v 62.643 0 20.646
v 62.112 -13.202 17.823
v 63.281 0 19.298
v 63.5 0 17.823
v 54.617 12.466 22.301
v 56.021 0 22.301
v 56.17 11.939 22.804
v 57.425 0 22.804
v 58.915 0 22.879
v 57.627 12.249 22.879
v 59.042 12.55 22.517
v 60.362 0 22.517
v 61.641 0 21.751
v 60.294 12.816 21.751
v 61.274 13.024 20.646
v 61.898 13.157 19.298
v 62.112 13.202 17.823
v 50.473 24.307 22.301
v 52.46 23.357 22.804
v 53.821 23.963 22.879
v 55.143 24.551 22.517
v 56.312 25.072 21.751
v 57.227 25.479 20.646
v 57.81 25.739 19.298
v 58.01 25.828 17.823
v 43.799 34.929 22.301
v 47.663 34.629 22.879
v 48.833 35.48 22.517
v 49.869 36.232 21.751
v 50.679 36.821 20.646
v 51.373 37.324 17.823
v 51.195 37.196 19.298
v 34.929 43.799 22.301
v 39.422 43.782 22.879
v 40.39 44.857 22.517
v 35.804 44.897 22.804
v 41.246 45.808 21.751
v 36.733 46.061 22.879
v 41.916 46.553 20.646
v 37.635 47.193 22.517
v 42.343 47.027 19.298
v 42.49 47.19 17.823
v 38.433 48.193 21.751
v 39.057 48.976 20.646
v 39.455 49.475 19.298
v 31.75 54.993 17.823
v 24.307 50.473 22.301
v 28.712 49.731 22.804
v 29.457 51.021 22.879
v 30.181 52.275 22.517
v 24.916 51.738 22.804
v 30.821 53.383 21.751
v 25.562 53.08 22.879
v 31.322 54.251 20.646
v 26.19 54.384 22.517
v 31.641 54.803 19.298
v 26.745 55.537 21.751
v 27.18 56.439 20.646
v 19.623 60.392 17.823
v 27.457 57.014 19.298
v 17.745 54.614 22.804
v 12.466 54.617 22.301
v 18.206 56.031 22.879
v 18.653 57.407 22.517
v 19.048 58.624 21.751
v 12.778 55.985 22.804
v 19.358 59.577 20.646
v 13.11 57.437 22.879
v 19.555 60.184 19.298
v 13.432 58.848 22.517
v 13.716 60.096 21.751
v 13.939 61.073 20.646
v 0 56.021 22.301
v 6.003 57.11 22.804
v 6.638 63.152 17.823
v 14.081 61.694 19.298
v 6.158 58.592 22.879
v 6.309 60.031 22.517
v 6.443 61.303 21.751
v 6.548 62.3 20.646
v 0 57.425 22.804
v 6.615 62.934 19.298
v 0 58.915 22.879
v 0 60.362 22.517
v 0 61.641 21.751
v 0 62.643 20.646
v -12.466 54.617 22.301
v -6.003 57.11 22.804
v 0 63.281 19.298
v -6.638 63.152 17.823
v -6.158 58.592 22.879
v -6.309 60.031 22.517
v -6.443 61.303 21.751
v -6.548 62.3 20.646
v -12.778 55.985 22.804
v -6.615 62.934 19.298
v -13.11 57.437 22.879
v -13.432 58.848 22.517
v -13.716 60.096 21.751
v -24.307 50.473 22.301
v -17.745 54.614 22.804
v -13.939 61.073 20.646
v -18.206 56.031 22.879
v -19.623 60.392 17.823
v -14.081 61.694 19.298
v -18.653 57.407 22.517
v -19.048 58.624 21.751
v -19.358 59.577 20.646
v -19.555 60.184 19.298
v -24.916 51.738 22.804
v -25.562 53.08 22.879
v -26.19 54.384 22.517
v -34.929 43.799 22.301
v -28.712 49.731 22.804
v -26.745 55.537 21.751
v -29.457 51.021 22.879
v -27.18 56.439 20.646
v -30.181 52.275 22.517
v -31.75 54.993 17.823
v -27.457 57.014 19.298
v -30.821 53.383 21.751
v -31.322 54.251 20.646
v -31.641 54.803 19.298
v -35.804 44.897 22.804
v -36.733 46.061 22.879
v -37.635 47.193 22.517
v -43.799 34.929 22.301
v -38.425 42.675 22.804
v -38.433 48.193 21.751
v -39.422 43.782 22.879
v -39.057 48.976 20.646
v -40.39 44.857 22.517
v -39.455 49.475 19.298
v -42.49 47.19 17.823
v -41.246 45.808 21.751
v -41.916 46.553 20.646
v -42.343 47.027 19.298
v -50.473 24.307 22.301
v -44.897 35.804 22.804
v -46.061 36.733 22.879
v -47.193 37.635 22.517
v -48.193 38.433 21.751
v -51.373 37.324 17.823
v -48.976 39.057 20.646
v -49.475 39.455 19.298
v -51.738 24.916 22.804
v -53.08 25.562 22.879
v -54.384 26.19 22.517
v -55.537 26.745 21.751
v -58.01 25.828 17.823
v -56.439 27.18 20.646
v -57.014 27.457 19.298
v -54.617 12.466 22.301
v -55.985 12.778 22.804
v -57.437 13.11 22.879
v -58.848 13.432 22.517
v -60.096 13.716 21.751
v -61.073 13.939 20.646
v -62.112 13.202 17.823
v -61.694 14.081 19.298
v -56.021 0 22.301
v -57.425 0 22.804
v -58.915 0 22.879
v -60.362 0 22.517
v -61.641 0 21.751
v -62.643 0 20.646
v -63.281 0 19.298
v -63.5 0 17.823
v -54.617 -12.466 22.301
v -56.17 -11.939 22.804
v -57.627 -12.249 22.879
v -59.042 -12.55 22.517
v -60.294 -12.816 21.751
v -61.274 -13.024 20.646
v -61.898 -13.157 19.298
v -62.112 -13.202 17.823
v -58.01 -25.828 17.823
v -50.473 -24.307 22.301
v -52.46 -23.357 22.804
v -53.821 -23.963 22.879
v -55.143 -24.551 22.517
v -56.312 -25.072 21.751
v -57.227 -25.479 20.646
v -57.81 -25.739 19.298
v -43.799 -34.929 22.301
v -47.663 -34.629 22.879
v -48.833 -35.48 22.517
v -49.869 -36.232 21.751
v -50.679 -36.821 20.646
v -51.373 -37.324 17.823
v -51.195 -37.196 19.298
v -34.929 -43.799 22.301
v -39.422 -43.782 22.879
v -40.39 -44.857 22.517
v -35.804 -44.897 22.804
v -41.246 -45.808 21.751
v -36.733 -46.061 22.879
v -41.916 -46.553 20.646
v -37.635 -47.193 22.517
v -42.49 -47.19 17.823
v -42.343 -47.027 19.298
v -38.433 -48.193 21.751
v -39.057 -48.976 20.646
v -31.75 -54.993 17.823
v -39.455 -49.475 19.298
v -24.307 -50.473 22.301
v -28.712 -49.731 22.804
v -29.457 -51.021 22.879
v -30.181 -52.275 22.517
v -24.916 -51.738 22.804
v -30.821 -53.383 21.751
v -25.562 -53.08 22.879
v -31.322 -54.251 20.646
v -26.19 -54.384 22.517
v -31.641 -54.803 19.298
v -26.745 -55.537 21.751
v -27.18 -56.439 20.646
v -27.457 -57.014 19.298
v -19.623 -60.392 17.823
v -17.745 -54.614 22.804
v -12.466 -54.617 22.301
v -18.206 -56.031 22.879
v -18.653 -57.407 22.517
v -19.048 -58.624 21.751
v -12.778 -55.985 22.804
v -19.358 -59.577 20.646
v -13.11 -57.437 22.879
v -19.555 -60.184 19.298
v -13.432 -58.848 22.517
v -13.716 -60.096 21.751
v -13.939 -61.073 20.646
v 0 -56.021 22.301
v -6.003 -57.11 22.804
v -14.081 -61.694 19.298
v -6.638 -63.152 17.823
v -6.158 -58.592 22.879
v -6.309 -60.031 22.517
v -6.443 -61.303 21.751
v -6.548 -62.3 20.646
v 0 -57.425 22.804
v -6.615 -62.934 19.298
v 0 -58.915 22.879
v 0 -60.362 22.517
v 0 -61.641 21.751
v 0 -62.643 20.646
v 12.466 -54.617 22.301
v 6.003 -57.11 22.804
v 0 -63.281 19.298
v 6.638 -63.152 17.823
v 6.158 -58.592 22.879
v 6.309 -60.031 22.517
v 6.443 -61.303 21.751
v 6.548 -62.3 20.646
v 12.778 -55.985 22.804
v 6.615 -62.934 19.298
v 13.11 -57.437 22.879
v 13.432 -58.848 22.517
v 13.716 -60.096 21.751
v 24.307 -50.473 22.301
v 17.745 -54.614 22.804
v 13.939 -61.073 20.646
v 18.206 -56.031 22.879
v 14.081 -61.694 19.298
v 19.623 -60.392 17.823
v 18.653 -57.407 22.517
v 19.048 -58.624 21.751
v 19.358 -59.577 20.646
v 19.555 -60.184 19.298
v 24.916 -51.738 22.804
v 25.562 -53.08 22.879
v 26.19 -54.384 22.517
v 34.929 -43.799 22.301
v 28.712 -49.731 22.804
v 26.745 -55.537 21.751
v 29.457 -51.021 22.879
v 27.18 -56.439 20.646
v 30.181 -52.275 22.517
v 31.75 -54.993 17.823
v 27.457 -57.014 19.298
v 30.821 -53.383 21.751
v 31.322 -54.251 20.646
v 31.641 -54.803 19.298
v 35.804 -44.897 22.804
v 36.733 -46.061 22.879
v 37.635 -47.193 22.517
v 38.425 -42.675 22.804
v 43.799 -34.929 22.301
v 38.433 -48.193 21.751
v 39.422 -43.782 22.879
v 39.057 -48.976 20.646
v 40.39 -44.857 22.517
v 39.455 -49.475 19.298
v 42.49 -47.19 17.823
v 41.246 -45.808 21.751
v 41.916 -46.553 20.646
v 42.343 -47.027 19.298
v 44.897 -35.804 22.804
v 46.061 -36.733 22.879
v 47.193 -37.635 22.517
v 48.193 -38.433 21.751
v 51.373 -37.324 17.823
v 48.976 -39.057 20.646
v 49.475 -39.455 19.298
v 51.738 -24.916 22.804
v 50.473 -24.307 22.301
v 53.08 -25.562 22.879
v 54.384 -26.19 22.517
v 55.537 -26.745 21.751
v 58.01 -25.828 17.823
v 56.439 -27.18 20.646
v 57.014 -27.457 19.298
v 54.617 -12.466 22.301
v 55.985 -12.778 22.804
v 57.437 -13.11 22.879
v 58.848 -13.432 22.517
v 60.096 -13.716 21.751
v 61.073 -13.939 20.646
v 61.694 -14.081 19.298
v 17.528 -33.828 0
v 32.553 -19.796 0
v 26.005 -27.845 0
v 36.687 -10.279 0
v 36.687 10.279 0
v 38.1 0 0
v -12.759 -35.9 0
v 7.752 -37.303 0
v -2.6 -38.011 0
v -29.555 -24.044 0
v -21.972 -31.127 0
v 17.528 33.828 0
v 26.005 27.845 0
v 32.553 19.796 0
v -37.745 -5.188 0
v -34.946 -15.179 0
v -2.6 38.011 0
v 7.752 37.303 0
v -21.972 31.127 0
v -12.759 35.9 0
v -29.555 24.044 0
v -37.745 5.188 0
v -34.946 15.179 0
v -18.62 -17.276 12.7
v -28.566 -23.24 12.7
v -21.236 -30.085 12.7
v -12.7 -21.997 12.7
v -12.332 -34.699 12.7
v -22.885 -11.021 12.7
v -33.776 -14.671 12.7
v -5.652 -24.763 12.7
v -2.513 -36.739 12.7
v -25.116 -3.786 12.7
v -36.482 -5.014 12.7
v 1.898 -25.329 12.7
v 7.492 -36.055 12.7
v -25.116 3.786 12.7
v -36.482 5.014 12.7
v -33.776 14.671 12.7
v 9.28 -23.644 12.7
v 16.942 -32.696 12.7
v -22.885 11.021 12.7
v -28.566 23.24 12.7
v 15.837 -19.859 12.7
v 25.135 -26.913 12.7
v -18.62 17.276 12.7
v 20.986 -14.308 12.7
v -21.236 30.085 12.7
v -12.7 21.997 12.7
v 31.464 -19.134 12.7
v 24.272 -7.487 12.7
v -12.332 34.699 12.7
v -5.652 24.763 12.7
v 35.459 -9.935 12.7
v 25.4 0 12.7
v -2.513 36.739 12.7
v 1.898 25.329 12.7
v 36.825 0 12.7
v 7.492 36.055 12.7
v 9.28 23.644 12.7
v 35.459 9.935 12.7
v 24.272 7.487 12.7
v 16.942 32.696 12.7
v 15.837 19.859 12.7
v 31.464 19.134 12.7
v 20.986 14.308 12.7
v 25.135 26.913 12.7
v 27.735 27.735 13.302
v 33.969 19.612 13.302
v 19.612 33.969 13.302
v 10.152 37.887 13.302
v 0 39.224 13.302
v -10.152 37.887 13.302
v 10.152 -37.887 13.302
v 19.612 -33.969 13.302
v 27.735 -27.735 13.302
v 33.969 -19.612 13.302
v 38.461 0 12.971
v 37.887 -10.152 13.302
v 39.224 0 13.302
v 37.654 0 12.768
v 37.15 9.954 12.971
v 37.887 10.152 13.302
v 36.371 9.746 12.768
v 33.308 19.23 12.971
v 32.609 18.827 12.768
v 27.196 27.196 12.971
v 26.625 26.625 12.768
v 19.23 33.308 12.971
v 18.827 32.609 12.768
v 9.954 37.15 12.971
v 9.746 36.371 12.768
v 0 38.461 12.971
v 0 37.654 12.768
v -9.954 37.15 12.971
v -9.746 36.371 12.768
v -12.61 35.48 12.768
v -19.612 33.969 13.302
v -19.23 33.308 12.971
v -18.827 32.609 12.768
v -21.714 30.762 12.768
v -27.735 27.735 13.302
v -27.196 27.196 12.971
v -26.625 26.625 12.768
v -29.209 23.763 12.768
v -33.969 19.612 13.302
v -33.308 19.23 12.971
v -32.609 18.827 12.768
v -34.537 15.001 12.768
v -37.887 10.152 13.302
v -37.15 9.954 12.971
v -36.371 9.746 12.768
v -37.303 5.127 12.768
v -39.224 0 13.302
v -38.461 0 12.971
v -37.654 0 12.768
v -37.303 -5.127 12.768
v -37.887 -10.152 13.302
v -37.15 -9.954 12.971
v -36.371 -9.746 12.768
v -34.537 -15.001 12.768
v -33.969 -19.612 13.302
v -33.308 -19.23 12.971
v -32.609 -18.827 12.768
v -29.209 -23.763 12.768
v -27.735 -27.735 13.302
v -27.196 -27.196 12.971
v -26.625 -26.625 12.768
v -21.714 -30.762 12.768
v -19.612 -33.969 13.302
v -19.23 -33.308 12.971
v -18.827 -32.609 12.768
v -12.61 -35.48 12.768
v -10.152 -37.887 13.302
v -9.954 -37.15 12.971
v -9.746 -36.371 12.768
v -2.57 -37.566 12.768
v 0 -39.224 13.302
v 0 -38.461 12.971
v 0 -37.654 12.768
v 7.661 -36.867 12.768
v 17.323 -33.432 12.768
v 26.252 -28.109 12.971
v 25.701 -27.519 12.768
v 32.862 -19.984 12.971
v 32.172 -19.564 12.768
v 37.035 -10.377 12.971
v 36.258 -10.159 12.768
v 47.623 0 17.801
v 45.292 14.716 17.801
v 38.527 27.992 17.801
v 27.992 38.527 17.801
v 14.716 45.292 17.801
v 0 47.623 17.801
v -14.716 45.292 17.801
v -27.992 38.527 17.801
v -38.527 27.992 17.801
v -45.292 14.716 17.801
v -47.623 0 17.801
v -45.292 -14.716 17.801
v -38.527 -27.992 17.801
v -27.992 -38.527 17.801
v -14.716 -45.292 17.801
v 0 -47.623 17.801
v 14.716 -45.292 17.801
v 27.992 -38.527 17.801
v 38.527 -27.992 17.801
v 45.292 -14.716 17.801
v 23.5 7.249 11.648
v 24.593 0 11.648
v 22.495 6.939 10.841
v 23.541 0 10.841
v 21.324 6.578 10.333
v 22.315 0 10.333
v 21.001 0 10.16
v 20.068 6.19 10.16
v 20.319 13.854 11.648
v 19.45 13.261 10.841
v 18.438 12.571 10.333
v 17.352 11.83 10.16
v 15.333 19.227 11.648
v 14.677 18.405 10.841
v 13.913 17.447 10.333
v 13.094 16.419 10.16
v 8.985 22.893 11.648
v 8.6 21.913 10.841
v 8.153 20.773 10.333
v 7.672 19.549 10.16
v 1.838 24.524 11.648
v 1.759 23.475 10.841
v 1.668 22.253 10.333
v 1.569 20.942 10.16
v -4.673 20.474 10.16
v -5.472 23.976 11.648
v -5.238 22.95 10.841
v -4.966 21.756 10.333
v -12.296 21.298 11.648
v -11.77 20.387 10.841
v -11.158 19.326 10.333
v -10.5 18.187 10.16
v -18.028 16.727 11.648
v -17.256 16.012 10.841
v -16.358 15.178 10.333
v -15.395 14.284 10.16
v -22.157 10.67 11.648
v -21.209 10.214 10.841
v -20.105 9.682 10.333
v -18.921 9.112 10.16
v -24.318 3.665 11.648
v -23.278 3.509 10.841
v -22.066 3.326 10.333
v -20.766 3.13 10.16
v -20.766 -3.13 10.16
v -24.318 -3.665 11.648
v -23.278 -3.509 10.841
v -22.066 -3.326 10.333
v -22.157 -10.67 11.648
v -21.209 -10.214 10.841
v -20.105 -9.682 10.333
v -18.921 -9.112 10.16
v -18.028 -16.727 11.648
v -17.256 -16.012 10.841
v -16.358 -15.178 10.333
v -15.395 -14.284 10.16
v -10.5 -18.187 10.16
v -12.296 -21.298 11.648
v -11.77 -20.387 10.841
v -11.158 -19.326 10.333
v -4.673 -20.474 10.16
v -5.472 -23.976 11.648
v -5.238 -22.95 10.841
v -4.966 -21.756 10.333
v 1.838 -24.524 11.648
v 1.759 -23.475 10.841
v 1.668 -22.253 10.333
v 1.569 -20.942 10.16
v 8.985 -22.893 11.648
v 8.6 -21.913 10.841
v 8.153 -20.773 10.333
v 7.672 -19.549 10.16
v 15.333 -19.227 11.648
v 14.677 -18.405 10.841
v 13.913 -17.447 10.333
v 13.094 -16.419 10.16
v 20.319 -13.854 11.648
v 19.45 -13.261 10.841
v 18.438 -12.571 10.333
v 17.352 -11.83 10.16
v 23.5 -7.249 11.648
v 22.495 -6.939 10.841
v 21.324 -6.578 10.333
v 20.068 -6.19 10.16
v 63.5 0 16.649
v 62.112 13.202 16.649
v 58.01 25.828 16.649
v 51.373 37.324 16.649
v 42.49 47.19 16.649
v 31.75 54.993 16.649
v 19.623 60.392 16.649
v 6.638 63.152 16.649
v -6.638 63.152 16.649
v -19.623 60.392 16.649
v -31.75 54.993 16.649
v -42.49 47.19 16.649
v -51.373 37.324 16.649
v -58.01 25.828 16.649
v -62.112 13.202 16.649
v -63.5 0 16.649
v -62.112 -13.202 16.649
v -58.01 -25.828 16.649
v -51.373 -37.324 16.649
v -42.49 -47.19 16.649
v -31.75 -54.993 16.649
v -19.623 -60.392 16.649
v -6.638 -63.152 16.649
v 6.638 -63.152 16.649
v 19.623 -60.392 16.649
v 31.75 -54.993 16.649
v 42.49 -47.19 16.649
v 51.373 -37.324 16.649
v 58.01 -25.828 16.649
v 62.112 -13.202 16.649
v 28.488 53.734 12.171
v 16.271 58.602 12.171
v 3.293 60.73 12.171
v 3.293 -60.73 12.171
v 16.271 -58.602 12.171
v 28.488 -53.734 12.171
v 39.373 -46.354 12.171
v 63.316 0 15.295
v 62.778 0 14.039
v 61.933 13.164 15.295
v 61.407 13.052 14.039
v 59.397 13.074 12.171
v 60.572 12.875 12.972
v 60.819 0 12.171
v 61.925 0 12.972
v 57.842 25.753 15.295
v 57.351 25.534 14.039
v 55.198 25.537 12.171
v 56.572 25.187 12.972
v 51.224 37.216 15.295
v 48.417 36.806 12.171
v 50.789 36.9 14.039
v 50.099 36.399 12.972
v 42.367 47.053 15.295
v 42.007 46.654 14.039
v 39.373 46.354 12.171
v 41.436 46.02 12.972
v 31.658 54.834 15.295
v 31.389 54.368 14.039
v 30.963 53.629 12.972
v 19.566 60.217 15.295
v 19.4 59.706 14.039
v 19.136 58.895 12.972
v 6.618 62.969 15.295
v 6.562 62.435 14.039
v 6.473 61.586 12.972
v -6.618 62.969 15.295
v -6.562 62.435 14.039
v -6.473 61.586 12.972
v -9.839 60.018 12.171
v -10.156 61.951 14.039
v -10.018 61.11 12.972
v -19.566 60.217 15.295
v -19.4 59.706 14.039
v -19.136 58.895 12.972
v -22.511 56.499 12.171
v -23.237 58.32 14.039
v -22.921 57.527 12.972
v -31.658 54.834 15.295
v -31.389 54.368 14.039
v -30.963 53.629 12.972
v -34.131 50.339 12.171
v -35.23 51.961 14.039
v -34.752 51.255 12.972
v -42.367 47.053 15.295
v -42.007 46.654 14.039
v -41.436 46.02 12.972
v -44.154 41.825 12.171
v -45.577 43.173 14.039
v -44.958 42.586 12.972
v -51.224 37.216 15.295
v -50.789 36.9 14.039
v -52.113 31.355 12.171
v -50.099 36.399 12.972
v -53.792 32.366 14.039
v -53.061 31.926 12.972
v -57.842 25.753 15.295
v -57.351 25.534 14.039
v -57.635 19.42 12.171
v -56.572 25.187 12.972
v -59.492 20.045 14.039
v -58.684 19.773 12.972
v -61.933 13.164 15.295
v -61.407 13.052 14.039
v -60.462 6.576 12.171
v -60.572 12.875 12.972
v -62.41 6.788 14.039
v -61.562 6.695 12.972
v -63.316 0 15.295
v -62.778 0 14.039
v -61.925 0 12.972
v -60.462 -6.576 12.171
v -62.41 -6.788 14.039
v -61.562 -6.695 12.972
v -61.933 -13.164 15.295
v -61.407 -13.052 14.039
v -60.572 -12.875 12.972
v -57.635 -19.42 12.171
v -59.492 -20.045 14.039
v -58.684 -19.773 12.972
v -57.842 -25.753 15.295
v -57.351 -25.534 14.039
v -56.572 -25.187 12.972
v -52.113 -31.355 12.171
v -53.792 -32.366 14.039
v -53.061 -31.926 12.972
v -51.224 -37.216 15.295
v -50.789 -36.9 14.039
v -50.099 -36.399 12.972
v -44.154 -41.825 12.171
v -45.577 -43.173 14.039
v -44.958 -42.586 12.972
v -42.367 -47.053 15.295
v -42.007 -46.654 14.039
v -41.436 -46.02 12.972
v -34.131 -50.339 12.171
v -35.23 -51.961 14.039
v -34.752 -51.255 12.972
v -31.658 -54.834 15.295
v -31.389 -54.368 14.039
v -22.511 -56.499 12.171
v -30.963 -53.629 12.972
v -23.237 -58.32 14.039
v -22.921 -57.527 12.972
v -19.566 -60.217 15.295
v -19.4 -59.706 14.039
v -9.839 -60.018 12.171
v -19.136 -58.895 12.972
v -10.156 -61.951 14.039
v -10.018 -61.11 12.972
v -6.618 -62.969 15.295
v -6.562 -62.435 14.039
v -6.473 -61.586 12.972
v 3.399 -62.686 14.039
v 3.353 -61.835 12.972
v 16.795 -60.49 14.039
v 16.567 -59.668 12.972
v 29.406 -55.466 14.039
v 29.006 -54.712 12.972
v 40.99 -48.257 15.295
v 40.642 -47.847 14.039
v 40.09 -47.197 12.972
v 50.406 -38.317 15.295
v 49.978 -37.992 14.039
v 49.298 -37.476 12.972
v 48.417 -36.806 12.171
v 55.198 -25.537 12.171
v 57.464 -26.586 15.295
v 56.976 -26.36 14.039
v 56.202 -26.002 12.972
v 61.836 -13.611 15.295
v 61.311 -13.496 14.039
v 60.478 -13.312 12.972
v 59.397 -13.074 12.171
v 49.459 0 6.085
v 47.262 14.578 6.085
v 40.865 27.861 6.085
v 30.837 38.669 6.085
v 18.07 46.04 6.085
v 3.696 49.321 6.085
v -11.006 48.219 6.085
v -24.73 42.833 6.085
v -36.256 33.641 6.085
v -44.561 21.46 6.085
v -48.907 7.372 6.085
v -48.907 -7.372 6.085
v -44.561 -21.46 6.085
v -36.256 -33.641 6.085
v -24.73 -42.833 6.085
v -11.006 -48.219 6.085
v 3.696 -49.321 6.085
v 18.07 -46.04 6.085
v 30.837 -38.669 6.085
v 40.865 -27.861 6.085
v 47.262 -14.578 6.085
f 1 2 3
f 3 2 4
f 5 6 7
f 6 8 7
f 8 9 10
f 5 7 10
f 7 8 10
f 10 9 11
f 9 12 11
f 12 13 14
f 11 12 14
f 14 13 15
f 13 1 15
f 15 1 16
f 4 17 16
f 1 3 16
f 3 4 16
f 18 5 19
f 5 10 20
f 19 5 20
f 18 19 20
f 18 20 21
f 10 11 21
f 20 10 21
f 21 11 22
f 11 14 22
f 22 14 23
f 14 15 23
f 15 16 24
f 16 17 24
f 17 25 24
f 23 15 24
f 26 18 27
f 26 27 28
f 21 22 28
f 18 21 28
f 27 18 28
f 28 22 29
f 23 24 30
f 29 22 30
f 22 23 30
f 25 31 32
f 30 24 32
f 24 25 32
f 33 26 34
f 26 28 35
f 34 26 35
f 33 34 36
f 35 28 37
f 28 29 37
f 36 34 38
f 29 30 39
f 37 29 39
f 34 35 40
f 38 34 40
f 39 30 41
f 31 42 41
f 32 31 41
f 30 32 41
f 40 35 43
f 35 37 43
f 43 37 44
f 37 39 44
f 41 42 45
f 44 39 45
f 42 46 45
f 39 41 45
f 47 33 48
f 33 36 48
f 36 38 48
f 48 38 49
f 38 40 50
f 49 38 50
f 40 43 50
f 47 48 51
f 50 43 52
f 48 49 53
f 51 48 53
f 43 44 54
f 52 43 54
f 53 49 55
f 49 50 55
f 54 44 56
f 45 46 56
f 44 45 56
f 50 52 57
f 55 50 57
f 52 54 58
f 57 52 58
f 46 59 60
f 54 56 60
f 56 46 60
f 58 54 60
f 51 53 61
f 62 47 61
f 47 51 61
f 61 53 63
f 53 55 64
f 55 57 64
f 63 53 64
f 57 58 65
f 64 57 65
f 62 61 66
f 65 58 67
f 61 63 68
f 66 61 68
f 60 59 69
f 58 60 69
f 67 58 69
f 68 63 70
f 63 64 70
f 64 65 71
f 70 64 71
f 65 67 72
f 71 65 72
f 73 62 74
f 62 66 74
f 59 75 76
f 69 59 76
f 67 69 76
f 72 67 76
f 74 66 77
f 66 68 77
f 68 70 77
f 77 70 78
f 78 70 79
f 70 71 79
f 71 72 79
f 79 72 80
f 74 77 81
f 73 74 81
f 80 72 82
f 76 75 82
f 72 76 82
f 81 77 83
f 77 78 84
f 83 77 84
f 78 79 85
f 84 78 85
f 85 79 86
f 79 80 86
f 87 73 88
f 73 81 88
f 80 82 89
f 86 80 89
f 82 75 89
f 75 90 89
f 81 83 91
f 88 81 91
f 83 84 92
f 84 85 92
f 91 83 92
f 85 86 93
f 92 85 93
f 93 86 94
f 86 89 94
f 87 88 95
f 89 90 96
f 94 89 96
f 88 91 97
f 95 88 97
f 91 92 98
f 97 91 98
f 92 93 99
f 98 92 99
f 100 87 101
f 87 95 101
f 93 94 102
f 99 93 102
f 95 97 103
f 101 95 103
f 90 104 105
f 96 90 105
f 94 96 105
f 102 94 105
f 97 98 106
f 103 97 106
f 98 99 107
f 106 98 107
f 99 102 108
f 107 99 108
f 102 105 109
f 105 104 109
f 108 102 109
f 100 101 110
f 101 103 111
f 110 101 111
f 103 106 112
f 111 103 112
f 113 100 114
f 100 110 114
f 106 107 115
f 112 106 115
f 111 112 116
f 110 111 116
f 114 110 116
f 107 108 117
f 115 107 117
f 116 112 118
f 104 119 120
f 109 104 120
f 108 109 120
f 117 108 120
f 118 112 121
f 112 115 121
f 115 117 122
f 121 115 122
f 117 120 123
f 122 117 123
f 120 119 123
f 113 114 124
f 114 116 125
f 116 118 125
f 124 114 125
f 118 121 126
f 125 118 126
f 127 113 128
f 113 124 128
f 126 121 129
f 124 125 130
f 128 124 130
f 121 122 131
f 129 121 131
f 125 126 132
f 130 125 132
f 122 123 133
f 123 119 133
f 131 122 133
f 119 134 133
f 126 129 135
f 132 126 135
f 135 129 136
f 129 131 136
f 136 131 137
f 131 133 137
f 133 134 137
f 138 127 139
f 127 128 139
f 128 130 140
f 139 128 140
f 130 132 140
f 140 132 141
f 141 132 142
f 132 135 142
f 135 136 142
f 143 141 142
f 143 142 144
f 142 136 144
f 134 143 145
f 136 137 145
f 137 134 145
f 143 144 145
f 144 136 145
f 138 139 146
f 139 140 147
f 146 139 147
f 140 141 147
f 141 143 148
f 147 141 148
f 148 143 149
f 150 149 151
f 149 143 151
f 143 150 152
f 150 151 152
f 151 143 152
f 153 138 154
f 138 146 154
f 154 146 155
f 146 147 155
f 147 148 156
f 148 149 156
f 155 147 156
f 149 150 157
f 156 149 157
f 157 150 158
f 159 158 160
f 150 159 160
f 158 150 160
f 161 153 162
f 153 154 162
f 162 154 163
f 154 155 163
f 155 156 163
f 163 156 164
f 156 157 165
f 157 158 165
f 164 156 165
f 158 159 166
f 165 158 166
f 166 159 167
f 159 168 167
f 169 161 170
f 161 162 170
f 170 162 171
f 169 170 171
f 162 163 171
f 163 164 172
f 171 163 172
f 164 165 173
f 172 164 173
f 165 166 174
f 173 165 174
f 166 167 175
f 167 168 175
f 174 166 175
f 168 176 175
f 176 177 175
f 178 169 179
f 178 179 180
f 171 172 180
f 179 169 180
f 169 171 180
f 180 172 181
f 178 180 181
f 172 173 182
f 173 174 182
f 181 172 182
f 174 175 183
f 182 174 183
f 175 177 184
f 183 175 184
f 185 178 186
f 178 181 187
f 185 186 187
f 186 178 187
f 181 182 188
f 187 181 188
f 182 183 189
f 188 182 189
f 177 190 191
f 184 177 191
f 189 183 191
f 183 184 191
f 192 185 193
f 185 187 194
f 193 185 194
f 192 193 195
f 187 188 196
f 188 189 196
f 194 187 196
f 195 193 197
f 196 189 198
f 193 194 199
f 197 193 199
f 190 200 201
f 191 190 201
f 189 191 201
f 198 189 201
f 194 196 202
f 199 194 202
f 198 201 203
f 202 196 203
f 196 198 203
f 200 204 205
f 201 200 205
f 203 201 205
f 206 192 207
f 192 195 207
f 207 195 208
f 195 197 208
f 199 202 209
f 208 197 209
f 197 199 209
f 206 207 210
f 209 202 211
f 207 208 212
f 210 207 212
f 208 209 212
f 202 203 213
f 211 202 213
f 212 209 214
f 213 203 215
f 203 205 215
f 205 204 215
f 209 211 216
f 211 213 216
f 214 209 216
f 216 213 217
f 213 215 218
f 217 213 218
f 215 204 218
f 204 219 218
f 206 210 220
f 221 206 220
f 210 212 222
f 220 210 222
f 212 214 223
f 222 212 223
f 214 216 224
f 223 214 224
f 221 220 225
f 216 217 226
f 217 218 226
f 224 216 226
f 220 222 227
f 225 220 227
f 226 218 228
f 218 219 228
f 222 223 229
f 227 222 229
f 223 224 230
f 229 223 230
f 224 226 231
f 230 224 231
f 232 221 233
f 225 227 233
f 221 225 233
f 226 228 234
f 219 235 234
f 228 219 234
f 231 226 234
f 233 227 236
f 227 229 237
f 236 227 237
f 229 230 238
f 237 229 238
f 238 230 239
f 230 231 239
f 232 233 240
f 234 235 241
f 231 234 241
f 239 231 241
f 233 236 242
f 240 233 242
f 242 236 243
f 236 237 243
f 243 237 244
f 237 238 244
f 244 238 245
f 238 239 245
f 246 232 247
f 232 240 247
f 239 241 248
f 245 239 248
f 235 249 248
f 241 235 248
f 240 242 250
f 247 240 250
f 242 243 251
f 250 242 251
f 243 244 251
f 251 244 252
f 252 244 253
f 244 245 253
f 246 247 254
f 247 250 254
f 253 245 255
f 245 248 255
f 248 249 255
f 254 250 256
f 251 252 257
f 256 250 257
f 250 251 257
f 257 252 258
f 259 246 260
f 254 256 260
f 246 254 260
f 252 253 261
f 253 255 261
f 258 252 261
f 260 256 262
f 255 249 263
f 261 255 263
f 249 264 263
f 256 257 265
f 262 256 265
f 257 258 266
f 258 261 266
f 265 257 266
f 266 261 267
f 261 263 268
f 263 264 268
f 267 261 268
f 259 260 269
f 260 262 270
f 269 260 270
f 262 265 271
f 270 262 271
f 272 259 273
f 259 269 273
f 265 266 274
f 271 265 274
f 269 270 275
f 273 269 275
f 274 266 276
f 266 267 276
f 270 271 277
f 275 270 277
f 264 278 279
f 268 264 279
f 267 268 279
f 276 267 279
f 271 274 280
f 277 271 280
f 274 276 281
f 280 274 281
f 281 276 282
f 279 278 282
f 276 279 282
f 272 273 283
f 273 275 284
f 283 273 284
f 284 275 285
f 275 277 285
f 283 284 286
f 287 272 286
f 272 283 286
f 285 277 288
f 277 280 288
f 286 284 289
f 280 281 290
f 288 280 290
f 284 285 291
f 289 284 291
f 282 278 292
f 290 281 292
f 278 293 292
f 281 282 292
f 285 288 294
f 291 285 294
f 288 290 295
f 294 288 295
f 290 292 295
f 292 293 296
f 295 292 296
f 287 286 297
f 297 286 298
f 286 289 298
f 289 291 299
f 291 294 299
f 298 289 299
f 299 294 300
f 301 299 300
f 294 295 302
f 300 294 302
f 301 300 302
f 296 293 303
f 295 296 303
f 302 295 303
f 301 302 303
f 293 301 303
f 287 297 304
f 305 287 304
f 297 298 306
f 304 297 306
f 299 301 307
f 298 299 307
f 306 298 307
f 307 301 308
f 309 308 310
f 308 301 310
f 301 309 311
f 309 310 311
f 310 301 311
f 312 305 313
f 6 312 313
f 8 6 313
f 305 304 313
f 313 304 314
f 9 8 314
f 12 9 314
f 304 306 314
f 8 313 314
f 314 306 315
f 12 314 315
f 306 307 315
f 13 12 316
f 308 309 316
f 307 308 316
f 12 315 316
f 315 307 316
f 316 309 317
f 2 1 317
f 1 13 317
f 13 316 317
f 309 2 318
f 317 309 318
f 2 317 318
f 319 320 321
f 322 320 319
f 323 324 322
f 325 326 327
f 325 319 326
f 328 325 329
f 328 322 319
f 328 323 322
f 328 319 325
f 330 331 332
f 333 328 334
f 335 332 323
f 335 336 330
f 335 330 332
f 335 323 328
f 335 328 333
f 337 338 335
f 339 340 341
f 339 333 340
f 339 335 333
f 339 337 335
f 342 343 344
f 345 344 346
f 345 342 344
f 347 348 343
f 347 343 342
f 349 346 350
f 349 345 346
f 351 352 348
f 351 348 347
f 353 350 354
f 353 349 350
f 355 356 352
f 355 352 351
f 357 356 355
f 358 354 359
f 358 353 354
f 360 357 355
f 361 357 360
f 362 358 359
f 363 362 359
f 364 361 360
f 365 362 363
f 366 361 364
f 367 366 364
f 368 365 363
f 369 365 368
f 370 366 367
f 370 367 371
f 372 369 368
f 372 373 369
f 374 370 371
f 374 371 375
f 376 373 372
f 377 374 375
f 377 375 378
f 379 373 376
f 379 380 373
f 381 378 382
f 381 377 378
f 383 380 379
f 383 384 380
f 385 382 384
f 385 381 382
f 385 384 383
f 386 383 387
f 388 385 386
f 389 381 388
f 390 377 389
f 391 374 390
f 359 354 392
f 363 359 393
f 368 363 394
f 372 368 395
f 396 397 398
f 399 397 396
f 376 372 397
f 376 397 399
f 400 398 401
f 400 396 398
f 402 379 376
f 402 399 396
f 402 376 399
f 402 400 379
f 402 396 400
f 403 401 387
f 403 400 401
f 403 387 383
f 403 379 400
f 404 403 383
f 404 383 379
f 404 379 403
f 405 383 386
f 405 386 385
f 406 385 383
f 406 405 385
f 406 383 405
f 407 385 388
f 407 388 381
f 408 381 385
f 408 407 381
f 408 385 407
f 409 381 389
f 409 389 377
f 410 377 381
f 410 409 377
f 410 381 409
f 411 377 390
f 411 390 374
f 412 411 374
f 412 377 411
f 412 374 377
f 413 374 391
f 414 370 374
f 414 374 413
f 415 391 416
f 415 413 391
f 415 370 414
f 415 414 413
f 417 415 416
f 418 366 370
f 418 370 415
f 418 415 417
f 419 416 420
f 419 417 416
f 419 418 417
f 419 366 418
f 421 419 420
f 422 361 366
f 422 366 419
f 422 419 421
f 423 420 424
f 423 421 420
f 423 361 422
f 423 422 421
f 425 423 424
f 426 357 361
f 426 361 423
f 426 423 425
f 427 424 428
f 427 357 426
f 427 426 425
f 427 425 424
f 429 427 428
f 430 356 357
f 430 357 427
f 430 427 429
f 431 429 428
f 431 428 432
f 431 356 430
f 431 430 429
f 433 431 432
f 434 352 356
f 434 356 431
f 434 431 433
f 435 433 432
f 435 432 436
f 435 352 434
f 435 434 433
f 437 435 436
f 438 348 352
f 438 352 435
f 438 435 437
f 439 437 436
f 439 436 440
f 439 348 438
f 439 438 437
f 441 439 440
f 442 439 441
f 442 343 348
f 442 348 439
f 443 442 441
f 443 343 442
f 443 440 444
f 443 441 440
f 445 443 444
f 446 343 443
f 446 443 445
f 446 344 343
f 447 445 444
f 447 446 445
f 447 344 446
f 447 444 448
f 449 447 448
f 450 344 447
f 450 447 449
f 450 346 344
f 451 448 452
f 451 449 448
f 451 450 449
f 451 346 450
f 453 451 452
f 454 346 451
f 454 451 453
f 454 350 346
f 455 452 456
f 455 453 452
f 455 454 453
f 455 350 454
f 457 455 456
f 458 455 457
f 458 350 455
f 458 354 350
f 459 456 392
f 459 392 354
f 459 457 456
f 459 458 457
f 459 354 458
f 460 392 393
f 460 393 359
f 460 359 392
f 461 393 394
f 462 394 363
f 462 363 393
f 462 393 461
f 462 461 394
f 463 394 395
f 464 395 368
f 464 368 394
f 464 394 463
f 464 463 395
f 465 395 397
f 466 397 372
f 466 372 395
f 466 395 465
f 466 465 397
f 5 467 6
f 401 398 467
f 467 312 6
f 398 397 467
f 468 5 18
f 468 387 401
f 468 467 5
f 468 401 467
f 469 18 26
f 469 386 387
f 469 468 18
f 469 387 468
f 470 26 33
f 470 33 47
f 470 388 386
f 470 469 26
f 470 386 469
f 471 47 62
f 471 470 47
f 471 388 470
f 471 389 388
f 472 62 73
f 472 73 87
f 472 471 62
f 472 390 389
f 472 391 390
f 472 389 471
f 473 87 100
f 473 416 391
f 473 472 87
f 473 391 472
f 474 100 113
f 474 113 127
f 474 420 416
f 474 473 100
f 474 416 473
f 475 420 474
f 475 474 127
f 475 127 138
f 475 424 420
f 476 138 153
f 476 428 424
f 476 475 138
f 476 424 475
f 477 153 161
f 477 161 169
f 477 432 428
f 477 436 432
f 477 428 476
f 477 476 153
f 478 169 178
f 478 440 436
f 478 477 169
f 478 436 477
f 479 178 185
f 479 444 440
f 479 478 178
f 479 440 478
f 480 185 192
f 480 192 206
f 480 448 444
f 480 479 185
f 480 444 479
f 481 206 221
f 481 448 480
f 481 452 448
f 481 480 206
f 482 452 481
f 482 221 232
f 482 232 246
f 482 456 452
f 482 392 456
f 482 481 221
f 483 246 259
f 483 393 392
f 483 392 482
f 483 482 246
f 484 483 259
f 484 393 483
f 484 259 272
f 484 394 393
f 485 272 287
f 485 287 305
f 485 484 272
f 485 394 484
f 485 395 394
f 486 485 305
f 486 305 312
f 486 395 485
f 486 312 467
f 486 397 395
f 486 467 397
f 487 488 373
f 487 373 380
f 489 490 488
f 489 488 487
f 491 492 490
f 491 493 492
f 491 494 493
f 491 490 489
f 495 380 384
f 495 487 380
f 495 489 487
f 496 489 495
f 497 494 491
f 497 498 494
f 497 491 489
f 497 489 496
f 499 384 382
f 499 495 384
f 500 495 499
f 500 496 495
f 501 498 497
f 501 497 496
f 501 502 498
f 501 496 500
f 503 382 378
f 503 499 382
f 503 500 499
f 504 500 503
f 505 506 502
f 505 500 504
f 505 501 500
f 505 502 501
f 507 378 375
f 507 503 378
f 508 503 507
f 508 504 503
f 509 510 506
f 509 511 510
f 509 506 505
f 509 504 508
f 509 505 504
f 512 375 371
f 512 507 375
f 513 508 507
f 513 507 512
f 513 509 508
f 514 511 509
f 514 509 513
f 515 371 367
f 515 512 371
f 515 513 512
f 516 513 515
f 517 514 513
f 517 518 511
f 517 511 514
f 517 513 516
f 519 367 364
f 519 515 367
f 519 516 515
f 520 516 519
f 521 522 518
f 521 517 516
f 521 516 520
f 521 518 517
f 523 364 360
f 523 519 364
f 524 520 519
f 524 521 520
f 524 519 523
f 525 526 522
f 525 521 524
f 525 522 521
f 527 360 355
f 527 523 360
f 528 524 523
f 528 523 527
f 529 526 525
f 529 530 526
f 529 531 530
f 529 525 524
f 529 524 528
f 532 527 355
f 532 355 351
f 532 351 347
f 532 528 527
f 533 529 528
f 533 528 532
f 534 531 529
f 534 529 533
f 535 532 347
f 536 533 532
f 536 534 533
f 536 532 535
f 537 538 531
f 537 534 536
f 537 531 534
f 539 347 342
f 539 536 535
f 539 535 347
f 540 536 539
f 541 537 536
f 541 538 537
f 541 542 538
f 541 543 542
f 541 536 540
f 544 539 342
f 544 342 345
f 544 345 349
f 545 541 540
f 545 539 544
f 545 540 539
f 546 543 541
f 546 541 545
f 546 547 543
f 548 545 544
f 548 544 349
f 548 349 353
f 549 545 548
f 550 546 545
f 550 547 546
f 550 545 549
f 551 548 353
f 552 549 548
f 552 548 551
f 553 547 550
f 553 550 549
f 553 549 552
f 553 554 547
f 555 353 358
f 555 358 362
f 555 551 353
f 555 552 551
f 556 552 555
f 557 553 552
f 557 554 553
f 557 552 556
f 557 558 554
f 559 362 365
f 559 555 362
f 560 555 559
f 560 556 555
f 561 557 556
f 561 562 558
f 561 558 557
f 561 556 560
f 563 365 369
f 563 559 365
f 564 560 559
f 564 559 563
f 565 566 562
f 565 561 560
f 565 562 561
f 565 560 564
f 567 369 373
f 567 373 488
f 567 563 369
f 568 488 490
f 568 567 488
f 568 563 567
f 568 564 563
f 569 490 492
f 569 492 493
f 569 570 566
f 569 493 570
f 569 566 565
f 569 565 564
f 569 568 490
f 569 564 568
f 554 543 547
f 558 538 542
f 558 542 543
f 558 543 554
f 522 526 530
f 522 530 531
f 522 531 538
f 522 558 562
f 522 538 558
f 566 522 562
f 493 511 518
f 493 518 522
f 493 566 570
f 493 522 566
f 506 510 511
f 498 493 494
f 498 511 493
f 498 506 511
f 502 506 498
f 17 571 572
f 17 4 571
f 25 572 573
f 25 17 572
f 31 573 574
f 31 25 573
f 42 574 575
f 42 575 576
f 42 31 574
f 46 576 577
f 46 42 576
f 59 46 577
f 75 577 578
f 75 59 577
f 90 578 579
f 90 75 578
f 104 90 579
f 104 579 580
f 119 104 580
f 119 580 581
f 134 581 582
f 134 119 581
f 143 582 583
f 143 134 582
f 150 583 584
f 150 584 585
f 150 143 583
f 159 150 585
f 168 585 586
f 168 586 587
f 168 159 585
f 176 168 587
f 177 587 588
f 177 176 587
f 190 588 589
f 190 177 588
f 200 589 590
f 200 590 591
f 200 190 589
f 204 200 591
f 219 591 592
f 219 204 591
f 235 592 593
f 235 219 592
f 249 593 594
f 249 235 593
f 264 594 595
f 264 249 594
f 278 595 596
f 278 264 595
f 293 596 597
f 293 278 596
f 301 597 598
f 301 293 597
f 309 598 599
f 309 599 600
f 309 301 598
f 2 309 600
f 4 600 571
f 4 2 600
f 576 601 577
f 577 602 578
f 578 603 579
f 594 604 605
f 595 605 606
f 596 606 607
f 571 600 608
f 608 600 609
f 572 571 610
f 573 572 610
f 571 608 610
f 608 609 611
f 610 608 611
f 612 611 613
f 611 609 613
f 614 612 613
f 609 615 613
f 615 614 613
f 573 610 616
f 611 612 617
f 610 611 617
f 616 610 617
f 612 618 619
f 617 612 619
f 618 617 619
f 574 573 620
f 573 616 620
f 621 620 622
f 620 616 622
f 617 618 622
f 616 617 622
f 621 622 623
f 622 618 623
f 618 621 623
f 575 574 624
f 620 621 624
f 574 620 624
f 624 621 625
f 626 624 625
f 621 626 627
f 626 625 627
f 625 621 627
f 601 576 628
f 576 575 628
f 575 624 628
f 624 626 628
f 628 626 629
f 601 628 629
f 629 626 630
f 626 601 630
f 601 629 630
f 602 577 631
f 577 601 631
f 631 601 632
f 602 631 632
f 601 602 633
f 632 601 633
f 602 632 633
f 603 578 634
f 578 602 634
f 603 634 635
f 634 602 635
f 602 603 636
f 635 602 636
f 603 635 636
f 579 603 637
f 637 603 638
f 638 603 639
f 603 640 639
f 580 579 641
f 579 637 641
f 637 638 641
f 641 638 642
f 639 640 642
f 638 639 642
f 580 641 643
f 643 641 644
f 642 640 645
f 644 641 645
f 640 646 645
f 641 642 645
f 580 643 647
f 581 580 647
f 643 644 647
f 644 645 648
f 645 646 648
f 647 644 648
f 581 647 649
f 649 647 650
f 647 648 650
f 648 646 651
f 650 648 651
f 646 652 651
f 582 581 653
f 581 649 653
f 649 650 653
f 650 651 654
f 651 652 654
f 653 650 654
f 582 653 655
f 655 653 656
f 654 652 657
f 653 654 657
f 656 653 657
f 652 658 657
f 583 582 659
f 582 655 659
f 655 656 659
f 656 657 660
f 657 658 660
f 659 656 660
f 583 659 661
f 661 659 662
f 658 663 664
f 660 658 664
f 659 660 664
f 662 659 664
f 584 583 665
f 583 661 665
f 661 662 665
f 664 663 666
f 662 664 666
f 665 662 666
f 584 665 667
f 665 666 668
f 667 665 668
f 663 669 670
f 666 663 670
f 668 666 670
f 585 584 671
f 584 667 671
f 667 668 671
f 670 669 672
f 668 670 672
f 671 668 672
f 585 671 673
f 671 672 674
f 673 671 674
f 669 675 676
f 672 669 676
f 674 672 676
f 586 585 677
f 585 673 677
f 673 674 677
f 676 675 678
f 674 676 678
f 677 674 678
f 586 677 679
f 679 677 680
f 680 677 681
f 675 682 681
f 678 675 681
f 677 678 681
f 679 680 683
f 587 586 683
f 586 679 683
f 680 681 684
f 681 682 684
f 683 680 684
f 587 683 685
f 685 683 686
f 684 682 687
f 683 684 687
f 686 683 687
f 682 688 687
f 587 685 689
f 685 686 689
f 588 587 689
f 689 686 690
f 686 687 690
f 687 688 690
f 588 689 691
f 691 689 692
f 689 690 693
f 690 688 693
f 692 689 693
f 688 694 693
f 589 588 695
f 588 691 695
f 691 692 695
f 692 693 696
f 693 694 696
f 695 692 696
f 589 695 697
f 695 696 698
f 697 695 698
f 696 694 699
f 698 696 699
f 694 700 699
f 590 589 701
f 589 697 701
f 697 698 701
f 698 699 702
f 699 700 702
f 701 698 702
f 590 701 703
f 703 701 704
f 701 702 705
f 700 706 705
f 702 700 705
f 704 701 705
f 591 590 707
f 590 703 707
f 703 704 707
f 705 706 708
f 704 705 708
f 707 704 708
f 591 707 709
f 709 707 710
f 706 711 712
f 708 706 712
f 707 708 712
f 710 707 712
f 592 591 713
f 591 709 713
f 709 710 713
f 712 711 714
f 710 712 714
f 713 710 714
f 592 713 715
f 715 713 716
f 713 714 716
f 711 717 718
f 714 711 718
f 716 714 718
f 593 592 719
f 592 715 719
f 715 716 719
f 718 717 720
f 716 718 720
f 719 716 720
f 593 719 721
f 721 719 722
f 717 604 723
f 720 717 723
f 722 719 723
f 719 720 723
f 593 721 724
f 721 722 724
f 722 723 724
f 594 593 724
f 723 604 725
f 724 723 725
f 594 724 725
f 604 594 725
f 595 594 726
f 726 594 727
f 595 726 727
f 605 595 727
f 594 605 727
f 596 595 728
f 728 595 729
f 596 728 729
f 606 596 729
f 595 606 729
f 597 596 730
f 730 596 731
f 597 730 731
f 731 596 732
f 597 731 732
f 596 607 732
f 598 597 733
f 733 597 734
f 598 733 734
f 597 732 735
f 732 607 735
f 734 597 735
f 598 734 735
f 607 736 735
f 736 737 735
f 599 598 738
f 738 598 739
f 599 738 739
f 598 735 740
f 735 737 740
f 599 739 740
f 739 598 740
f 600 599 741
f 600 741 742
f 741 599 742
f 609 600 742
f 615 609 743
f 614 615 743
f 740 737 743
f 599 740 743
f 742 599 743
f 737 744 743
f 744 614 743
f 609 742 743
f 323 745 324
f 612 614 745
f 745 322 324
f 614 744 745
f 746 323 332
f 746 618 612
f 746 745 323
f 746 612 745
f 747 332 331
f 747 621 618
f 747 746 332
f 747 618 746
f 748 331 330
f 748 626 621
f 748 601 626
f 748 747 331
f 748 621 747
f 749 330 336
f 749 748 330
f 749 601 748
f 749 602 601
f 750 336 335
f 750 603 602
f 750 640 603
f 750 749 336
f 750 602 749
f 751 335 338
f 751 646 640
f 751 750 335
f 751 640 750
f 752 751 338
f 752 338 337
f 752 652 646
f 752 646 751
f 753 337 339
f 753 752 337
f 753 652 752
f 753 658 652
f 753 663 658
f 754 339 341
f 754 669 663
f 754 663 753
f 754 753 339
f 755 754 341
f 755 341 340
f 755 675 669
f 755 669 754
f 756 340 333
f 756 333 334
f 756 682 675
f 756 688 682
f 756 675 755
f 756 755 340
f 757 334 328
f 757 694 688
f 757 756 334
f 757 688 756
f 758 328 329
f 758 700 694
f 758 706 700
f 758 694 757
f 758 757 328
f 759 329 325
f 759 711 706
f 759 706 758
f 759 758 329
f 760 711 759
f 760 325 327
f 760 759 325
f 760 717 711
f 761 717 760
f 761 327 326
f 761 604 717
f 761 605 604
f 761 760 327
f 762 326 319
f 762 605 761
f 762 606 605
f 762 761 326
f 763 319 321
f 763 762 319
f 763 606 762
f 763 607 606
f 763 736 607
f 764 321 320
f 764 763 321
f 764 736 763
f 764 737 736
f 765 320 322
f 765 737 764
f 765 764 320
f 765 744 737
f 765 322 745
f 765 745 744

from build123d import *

# Parameters (mm, degrees)
F3_R     = 25.4
F4_DEPTH = 2.54


# Not quite as in the source:
# - a fillet or chamfer that OpenCascade refuses, or shapes differently, is made with other operations: its cross-section is extruded or revolved along the edge and cut away or added


with BuildPart() as f2:
    # F0 (on Front) → F2 (revolve)
    with BuildSketch(Plane.XZ):
        Polygon((63.5, 13.6071443505), (63.5, 26.3071443505), (38.1, 12.7), (0, 12.7), (0, 0), (38.1, 0), align=None)
    revolve(axis=Axis((0, 0, 37.3074896634), (0, 0, 1)))

    # F3 (on face) → F4 (cut)
    with BuildSketch(Plane.XY.offset(12.7)):
        Circle(F3_R)
    extrude(amount=-F4_DEPTH, mode=Mode.SUBTRACT)

    # F5: fillet of radius 5.08 on 4 edges, made by hand

    # F5_s1 → F5_t2 (revolve)
    with BuildSketch(Plane.XZ):
        with BuildLine():
            ThreePointArc((39.2238860188, 13.3020818618), (38.0616448552, 12.8528190544), (36.8250010386, 12.7))
            Line((36.8250010386, 12.7), (38.1, 12.7))
            Line((38.1, 12.7), (39.2238860188, 13.3020818618))
        make_face()
    revolve(axis=Axis((0, 0, 12.7), (0, 0, 1)))

    # F5_s3 → F5_t4 (revolve)
    with BuildSketch(Plane.XZ):
        with BuildLine():
            ThreePointArc((25.4, 12.7), (23.5405909488, 10.8405909488), (21.0005909488, 10.16))
            Line((21.0005909488, 10.16), (25.4, 10.16))
            Line((25.4, 10.16), (25.4, 12.7))
        make_face()
    revolve(axis=Axis((0, 0, 10.16), (0, 0, 1)))

    # F5_s5 → F5_t6 (revolve, cut)
    with BuildSketch(Plane.XZ):
        with BuildLine():
            ThreePointArc((56.0211150199, 22.3005983857), (61.0296038302, 22.181162535), (63.5, 17.8226802476))
            Line((63.5, 17.8226802476), (63.5, 26.3071443505))
            Line((63.5, 26.3071443505), (56.0211150199, 22.3005983857))
        make_face()
    revolve(axis=Axis((0, 0, 26.3071443505), (0, 0, 1)), mode=Mode.SUBTRACT)

    # F5_s7 → F5_t8 (revolve, cut)
    with BuildSketch(Plane.XZ):
        with BuildLine():
            ThreePointArc((63.5, 16.6487507133), (62.7784822874, 14.0391468831), (60.8188849801, 12.1708325751))
            Line((60.8188849801, 12.1708325751), (63.5, 13.6071443505))
            Line((63.5, 13.6071443505), (63.5, 16.6487507133))
        make_face()
    revolve(axis=Axis((0, 0, 13.6071443505), (0, 0, 1)), mode=Mode.SUBTRACT)


solid = f2.part
